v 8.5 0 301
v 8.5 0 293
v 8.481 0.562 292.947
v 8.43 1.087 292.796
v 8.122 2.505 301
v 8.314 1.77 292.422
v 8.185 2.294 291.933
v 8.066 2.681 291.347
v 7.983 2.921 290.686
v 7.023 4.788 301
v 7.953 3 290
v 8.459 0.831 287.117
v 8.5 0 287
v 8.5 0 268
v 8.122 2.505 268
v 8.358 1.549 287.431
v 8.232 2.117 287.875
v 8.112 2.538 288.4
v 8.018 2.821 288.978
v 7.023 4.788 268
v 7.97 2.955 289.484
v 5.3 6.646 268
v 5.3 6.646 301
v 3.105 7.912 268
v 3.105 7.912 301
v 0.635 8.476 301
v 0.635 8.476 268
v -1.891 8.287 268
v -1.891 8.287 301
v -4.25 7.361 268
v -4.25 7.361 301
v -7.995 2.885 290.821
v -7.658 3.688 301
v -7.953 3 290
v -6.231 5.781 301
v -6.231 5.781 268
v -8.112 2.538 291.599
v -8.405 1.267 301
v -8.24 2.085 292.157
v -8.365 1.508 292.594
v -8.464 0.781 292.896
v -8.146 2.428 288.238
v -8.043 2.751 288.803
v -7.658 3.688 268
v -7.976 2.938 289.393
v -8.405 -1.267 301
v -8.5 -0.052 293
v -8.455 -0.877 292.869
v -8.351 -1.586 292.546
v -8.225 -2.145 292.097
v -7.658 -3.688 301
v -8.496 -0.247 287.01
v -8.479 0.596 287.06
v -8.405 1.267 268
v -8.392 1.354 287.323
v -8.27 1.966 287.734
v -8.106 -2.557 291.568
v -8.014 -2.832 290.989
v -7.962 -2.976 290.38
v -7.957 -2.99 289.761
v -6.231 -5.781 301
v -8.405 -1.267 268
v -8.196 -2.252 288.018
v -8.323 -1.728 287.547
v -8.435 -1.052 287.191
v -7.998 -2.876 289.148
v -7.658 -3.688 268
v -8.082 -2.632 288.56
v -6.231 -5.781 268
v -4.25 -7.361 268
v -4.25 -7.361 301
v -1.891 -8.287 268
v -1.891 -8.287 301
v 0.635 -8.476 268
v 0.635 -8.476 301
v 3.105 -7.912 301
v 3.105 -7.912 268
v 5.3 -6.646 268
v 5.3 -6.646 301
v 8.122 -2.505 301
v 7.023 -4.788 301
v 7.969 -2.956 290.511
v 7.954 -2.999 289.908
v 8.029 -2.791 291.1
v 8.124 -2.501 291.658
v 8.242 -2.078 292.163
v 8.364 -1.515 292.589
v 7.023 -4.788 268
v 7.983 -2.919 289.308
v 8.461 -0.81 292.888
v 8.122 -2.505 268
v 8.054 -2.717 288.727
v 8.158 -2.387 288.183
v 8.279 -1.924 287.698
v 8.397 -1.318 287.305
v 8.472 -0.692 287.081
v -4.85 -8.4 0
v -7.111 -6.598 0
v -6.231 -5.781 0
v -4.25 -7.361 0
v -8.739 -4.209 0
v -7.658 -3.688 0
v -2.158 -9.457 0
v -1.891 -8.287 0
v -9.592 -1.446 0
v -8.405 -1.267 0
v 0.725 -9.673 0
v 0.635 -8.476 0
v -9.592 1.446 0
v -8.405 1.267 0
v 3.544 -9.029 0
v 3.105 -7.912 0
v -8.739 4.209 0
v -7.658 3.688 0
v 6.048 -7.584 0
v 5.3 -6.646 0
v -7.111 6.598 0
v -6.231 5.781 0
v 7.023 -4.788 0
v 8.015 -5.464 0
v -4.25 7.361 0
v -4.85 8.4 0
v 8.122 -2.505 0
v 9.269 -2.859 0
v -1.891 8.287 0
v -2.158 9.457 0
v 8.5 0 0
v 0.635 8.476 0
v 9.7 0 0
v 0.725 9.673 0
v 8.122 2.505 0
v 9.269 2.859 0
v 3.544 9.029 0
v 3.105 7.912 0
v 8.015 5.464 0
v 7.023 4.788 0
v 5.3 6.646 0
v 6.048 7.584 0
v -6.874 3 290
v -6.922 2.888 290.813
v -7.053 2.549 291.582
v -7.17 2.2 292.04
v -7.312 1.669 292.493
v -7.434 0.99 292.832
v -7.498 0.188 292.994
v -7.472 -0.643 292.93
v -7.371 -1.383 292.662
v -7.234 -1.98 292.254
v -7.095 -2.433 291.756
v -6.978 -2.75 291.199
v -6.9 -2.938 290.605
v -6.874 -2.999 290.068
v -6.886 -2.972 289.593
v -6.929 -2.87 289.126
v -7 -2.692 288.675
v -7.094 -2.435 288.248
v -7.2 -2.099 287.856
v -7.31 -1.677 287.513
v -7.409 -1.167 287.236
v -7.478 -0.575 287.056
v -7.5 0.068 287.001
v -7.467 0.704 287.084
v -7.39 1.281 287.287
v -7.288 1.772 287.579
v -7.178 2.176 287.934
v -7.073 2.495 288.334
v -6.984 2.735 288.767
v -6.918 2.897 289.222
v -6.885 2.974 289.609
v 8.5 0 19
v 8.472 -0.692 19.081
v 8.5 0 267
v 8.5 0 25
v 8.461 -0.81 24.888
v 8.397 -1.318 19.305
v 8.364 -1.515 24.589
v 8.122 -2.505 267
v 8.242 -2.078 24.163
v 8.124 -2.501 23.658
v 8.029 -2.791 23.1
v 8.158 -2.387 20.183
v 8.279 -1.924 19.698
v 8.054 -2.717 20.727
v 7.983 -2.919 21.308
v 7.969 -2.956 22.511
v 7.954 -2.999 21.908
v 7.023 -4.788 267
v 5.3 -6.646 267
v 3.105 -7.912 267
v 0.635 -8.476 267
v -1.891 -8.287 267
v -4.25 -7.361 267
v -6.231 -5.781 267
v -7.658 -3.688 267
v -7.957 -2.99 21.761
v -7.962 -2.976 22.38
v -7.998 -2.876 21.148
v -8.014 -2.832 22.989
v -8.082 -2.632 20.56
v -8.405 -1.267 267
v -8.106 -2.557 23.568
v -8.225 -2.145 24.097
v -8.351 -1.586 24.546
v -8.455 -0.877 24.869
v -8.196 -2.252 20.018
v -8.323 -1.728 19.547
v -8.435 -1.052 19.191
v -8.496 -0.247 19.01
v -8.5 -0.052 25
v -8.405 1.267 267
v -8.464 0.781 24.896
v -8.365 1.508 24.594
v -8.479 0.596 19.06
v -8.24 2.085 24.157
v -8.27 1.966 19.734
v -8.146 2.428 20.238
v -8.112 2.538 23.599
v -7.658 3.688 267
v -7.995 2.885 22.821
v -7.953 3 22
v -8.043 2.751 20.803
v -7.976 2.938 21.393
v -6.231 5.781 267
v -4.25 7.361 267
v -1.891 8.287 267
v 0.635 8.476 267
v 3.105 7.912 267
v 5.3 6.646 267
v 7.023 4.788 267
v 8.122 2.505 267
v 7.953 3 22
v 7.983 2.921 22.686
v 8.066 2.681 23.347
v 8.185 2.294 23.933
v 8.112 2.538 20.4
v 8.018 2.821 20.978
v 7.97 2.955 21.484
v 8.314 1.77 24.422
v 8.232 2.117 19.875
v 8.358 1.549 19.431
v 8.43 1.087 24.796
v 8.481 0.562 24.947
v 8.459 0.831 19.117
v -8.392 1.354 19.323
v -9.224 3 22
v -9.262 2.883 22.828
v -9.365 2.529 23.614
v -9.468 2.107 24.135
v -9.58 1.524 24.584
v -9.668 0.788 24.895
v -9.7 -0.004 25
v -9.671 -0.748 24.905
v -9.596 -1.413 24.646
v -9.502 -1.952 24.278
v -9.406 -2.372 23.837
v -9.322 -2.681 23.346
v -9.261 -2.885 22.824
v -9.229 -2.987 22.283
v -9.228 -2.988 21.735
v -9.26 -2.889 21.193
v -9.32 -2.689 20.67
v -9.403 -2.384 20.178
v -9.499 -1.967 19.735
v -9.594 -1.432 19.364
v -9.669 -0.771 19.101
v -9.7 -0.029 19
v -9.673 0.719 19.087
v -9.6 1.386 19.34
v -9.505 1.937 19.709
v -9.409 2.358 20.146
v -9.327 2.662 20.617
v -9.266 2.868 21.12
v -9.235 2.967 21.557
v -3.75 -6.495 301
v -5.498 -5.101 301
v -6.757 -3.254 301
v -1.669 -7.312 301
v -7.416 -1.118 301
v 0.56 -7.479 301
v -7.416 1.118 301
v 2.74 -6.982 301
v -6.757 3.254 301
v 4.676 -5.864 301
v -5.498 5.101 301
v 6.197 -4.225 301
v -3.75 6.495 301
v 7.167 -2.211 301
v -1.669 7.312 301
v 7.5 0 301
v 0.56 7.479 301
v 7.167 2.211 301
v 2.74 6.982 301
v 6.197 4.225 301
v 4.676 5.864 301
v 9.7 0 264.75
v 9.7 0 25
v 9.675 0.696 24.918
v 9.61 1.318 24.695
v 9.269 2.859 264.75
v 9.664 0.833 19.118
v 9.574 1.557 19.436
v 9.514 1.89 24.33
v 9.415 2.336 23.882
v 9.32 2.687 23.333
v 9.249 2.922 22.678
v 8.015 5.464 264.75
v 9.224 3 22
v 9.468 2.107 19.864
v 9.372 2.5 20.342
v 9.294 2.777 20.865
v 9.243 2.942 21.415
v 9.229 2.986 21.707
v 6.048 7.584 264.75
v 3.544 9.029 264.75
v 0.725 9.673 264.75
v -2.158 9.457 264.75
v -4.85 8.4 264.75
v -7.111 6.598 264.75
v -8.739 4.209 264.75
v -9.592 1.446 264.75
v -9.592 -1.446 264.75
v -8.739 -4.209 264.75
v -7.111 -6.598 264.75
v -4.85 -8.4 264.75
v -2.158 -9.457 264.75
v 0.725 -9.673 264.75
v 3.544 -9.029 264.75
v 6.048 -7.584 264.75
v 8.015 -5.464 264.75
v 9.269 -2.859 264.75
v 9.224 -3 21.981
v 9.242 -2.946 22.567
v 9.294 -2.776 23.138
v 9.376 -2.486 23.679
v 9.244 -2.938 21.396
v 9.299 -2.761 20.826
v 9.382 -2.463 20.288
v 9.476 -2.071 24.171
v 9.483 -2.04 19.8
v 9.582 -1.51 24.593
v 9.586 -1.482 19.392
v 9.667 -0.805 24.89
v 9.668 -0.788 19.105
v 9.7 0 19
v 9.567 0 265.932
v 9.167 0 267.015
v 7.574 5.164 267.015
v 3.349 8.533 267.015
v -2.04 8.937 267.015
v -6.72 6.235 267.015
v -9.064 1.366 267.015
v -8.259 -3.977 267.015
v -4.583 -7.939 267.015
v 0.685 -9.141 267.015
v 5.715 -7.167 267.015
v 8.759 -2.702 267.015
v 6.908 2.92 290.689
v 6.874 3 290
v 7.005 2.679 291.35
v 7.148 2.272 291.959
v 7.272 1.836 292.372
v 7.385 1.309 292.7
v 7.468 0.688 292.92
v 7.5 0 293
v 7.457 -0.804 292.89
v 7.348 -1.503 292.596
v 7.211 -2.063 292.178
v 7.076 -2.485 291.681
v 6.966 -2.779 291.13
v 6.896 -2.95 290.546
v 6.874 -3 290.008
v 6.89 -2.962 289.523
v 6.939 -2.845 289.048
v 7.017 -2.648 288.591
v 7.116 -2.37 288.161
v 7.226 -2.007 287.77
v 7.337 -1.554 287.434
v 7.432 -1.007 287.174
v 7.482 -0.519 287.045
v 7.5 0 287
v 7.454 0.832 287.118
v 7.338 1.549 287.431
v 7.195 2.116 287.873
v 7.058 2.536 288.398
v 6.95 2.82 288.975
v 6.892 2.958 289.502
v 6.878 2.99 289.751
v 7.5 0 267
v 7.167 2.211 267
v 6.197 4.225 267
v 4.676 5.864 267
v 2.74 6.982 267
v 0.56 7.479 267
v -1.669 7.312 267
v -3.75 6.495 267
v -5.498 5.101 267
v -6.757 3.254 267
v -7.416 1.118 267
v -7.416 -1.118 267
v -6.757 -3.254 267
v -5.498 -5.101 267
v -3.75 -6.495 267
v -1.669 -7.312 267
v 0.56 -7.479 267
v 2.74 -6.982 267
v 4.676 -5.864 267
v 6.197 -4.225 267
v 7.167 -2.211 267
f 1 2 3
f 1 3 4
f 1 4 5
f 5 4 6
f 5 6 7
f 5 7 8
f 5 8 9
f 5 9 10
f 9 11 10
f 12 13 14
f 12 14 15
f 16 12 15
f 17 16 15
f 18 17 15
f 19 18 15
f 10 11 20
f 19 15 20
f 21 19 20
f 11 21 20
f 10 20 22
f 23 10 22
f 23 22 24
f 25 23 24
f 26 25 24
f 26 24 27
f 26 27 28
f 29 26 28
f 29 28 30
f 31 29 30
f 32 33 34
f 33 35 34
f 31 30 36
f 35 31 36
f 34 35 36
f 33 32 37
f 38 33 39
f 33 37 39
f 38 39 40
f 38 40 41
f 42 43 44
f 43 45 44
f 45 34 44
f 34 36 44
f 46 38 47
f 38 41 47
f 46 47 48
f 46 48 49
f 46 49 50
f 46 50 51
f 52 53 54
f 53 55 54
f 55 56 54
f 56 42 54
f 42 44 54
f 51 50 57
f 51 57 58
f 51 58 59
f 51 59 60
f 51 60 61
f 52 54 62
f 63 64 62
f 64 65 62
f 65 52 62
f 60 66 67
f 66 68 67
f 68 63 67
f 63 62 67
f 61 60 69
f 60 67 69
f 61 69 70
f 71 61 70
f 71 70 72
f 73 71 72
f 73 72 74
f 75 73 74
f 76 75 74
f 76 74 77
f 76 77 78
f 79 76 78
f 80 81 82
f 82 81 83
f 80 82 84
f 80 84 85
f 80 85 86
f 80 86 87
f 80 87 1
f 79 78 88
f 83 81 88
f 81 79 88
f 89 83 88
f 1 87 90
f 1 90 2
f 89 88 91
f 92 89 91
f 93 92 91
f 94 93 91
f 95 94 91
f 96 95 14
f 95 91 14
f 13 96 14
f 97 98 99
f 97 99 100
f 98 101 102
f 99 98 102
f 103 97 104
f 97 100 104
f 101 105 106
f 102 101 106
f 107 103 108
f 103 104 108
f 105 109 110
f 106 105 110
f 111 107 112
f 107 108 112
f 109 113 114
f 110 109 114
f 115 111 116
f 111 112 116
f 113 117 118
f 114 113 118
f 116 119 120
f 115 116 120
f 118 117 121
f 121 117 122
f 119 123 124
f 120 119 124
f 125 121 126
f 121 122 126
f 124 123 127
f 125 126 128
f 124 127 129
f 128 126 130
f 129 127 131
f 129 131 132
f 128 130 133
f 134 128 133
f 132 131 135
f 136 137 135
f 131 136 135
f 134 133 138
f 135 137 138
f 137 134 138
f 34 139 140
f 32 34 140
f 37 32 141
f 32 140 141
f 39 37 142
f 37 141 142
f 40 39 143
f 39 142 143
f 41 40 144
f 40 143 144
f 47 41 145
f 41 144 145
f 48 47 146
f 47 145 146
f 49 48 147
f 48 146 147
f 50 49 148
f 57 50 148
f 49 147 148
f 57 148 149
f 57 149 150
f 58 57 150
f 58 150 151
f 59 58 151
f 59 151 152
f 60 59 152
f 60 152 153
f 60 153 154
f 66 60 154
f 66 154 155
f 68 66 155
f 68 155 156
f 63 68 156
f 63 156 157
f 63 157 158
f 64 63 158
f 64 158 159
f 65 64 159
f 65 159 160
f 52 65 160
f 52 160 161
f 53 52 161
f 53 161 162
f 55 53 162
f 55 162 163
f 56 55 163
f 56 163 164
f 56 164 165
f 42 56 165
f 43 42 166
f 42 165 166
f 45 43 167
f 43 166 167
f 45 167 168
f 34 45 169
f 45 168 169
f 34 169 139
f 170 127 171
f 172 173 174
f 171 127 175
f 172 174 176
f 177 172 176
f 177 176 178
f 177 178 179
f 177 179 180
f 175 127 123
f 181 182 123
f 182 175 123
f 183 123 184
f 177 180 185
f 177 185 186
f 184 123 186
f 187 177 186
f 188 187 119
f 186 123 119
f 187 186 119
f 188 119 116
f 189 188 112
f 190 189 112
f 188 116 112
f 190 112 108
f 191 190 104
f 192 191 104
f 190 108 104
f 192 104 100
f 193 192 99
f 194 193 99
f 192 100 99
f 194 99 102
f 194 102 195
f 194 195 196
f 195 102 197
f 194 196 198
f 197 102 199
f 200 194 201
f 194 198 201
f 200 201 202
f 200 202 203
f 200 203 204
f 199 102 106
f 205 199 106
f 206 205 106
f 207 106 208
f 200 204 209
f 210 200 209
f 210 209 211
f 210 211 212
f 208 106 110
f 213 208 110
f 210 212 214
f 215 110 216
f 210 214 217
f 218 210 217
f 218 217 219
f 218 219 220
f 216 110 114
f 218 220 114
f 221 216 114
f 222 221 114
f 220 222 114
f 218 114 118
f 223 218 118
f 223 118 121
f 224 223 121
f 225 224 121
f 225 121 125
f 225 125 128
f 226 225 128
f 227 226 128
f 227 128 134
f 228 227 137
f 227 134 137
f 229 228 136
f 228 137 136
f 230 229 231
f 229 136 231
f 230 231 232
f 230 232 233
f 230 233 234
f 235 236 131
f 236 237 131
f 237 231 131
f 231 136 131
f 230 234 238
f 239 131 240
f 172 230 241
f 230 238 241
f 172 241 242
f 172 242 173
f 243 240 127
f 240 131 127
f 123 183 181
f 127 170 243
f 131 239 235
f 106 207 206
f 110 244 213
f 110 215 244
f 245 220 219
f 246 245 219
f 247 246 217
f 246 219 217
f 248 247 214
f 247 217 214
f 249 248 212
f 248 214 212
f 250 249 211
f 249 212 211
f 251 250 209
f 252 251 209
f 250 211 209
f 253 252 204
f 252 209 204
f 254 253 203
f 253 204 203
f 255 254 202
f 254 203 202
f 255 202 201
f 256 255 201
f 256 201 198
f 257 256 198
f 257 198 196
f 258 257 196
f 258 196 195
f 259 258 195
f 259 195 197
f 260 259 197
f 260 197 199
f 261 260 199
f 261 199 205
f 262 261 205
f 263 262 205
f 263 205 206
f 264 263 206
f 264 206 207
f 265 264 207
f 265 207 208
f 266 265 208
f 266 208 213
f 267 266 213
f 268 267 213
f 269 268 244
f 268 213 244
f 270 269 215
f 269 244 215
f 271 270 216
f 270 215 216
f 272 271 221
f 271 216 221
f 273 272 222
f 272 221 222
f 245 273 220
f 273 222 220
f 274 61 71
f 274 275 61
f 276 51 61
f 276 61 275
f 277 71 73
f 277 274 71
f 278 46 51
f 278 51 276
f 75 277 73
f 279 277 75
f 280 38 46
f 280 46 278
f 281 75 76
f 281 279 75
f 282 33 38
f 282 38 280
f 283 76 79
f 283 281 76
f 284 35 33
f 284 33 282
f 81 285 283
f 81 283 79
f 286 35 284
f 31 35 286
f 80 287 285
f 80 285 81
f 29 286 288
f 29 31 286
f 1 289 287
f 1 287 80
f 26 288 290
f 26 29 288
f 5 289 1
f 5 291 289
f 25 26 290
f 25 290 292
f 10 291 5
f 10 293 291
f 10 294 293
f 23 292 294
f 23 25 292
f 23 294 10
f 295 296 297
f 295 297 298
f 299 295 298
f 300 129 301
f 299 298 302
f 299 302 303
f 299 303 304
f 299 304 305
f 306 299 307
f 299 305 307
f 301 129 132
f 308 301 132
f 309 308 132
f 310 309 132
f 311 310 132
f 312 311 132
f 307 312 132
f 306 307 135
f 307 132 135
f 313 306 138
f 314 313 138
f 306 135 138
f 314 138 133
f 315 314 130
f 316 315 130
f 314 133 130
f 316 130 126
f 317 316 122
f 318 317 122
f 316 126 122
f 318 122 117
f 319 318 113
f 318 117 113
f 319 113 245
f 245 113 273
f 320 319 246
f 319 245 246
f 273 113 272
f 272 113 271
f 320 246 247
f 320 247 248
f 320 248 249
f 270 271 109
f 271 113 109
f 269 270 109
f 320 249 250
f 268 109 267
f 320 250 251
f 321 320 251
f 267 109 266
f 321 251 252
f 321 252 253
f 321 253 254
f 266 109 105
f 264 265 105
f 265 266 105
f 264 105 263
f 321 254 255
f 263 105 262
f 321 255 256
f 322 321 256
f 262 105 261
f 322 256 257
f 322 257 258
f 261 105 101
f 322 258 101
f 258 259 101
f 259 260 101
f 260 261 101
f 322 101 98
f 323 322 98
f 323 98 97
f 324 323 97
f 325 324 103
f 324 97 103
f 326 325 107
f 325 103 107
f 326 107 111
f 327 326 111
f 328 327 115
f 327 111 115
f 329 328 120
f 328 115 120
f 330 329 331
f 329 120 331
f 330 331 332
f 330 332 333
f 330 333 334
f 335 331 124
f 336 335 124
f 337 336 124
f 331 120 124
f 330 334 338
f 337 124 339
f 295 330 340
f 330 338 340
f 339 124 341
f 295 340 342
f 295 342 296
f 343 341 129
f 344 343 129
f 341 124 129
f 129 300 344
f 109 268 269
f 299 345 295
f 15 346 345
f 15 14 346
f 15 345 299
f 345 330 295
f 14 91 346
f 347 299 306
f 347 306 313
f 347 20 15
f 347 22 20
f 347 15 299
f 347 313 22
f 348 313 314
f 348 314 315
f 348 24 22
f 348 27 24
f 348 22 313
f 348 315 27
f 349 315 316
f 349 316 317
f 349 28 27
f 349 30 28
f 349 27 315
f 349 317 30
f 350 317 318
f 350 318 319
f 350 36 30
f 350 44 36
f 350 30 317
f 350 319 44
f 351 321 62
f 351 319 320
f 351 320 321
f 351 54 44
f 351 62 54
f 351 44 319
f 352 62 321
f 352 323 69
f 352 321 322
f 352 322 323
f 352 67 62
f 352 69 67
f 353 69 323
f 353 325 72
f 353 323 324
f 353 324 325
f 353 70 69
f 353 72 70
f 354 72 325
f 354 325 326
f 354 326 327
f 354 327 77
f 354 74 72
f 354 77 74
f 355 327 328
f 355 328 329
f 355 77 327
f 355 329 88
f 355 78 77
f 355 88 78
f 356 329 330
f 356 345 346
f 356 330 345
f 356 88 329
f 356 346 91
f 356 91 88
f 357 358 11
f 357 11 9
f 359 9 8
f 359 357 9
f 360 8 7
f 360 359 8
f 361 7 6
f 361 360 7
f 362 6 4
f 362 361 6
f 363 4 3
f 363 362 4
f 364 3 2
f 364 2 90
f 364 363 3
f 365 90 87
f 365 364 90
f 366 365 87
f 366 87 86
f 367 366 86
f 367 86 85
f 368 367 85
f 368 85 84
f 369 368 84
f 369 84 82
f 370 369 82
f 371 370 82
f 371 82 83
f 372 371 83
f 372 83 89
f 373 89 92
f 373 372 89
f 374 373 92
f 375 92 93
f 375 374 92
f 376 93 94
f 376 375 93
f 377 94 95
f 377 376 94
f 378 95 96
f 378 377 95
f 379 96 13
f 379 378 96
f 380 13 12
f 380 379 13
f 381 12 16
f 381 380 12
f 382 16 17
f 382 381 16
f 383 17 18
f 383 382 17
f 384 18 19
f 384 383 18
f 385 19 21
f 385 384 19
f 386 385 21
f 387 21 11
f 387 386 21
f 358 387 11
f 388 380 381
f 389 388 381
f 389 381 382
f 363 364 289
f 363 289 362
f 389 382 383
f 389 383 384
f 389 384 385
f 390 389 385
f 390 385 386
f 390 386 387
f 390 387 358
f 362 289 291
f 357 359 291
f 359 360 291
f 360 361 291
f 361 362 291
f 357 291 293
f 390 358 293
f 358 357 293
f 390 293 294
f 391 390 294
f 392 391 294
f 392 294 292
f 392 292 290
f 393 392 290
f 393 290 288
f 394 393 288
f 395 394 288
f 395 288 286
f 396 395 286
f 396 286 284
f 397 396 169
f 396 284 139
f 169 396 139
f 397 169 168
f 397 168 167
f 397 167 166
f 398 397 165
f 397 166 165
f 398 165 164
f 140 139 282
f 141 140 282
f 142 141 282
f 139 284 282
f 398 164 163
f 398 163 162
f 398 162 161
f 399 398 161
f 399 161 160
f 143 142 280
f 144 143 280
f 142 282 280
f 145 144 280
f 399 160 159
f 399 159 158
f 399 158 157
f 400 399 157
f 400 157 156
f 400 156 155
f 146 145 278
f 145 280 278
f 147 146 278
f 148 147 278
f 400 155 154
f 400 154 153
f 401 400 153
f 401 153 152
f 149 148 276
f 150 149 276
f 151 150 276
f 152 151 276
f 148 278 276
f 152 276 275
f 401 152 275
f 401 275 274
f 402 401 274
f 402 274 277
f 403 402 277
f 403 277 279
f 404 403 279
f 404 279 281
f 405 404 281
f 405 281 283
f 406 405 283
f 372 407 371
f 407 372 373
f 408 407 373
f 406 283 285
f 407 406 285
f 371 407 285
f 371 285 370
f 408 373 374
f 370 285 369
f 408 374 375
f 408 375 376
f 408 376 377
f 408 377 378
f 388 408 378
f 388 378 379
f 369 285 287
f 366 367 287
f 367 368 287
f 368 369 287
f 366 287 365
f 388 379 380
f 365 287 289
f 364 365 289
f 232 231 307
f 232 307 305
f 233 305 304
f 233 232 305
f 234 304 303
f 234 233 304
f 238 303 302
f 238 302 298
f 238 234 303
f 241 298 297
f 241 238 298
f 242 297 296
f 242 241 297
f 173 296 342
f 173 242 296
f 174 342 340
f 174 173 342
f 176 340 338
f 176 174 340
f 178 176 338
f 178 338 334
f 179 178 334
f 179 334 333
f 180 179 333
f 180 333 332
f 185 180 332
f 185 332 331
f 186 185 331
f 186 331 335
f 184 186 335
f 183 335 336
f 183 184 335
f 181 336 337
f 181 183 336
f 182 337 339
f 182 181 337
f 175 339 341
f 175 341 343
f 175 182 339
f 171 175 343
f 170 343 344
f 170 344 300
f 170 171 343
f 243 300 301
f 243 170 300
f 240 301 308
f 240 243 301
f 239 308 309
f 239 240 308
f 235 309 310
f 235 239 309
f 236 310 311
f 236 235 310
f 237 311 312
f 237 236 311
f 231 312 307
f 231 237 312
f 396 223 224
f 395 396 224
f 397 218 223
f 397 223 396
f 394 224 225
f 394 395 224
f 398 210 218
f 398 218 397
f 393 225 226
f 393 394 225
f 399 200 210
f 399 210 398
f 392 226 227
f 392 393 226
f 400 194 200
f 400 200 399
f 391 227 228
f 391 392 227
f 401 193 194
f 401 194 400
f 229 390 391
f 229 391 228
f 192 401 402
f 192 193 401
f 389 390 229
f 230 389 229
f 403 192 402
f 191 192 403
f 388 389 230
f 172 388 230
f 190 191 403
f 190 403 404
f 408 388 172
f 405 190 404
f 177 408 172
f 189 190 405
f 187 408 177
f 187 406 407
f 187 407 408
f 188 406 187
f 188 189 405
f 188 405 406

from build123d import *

# Parameters (mm, degrees)
F0_R          = 9.7
F1_DEPTH      = 268
F2_R          = 8.5
F3_DEPTH      = 33
F5_R          = 7.5
F6_DEPTH      = 36.4
F7_R          = 8.5
F8_DEPTH      = 267
F4_R          = 3
F9_DEPTH      = 25
F9_DEPTH_BACK = 25


# Not quite as in the source:
# - a fillet or chamfer that OpenCascade refuses, or shapes differently, is made with other operations: its cross-section is extruded or revolved along the edge and cut away or added


with BuildPart() as f1:
    # F0 (on Top) → F1 (new body)
    with BuildSketch(Plane.XY):
        Circle(F0_R)
    extrude(amount=F1_DEPTH)

    # F2 (on face) → F3 (join)
    with BuildSketch(Plane.XY.offset(268)):
        Circle(F2_R)
    extrude(amount=F3_DEPTH)

    # F5 (on face) → F6 (cut)
    with BuildSketch(Plane.XY.offset(301)):
        Circle(F5_R)
    extrude(amount=-F6_DEPTH, mode=Mode.SUBTRACT)

    # F7 (on face) → F8 (cut)
    with BuildSketch(Plane(origin=(0, 0, 0), x_dir=(1, 0, 0), z_dir=(0, 0, -1))):
        Circle(F7_R)
    extrude(amount=-F8_DEPTH, mode=Mode.SUBTRACT)

    # F4 (on Right) → F9 (cut, two sides)
    with BuildSketch(Plane.YZ) as f9_sk:
        with Locations((0, 22)):
            Circle(F4_R)
        with Locations((0, 290)):
            Circle(F4_R)
    extrude(amount=-F9_DEPTH, mode=Mode.SUBTRACT)
    extrude(f9_sk.sketch, amount=F9_DEPTH_BACK, mode=Mode.SUBTRACT)

    # F10: fillet of radius 5 on 1 edges, made by hand

    # F10_s1 → F10_t2 (revolve, cut)
    with BuildSketch(Plane.XZ):
        with BuildLine():
            add(Edge.make_bspline(
                [(9.7, 264.7503846381), (9.7, 266.5967570028), (8.5, 268)],
                knots=[0, 0, 0, 1, 1, 1], degree=2, weights=[1, 1, 1]))
            Line((8.5, 268), (8.576, 268.0649923072))
            ThreePointArc((8.576, 268.0649923072), (9.1, 268.1), (9.7, 268.1))
            Line((9.7, 268.1), (9.8, 268))
            Line((9.8, 268), (9.8, 264.7503846381))
            Line((9.8, 264.7503846381), (9.7, 264.7503846381))
        make_face()
    revolve(axis=Axis((0, 0, 268), (0, 0, 1)), mode=Mode.SUBTRACT)


solid = f1.part
